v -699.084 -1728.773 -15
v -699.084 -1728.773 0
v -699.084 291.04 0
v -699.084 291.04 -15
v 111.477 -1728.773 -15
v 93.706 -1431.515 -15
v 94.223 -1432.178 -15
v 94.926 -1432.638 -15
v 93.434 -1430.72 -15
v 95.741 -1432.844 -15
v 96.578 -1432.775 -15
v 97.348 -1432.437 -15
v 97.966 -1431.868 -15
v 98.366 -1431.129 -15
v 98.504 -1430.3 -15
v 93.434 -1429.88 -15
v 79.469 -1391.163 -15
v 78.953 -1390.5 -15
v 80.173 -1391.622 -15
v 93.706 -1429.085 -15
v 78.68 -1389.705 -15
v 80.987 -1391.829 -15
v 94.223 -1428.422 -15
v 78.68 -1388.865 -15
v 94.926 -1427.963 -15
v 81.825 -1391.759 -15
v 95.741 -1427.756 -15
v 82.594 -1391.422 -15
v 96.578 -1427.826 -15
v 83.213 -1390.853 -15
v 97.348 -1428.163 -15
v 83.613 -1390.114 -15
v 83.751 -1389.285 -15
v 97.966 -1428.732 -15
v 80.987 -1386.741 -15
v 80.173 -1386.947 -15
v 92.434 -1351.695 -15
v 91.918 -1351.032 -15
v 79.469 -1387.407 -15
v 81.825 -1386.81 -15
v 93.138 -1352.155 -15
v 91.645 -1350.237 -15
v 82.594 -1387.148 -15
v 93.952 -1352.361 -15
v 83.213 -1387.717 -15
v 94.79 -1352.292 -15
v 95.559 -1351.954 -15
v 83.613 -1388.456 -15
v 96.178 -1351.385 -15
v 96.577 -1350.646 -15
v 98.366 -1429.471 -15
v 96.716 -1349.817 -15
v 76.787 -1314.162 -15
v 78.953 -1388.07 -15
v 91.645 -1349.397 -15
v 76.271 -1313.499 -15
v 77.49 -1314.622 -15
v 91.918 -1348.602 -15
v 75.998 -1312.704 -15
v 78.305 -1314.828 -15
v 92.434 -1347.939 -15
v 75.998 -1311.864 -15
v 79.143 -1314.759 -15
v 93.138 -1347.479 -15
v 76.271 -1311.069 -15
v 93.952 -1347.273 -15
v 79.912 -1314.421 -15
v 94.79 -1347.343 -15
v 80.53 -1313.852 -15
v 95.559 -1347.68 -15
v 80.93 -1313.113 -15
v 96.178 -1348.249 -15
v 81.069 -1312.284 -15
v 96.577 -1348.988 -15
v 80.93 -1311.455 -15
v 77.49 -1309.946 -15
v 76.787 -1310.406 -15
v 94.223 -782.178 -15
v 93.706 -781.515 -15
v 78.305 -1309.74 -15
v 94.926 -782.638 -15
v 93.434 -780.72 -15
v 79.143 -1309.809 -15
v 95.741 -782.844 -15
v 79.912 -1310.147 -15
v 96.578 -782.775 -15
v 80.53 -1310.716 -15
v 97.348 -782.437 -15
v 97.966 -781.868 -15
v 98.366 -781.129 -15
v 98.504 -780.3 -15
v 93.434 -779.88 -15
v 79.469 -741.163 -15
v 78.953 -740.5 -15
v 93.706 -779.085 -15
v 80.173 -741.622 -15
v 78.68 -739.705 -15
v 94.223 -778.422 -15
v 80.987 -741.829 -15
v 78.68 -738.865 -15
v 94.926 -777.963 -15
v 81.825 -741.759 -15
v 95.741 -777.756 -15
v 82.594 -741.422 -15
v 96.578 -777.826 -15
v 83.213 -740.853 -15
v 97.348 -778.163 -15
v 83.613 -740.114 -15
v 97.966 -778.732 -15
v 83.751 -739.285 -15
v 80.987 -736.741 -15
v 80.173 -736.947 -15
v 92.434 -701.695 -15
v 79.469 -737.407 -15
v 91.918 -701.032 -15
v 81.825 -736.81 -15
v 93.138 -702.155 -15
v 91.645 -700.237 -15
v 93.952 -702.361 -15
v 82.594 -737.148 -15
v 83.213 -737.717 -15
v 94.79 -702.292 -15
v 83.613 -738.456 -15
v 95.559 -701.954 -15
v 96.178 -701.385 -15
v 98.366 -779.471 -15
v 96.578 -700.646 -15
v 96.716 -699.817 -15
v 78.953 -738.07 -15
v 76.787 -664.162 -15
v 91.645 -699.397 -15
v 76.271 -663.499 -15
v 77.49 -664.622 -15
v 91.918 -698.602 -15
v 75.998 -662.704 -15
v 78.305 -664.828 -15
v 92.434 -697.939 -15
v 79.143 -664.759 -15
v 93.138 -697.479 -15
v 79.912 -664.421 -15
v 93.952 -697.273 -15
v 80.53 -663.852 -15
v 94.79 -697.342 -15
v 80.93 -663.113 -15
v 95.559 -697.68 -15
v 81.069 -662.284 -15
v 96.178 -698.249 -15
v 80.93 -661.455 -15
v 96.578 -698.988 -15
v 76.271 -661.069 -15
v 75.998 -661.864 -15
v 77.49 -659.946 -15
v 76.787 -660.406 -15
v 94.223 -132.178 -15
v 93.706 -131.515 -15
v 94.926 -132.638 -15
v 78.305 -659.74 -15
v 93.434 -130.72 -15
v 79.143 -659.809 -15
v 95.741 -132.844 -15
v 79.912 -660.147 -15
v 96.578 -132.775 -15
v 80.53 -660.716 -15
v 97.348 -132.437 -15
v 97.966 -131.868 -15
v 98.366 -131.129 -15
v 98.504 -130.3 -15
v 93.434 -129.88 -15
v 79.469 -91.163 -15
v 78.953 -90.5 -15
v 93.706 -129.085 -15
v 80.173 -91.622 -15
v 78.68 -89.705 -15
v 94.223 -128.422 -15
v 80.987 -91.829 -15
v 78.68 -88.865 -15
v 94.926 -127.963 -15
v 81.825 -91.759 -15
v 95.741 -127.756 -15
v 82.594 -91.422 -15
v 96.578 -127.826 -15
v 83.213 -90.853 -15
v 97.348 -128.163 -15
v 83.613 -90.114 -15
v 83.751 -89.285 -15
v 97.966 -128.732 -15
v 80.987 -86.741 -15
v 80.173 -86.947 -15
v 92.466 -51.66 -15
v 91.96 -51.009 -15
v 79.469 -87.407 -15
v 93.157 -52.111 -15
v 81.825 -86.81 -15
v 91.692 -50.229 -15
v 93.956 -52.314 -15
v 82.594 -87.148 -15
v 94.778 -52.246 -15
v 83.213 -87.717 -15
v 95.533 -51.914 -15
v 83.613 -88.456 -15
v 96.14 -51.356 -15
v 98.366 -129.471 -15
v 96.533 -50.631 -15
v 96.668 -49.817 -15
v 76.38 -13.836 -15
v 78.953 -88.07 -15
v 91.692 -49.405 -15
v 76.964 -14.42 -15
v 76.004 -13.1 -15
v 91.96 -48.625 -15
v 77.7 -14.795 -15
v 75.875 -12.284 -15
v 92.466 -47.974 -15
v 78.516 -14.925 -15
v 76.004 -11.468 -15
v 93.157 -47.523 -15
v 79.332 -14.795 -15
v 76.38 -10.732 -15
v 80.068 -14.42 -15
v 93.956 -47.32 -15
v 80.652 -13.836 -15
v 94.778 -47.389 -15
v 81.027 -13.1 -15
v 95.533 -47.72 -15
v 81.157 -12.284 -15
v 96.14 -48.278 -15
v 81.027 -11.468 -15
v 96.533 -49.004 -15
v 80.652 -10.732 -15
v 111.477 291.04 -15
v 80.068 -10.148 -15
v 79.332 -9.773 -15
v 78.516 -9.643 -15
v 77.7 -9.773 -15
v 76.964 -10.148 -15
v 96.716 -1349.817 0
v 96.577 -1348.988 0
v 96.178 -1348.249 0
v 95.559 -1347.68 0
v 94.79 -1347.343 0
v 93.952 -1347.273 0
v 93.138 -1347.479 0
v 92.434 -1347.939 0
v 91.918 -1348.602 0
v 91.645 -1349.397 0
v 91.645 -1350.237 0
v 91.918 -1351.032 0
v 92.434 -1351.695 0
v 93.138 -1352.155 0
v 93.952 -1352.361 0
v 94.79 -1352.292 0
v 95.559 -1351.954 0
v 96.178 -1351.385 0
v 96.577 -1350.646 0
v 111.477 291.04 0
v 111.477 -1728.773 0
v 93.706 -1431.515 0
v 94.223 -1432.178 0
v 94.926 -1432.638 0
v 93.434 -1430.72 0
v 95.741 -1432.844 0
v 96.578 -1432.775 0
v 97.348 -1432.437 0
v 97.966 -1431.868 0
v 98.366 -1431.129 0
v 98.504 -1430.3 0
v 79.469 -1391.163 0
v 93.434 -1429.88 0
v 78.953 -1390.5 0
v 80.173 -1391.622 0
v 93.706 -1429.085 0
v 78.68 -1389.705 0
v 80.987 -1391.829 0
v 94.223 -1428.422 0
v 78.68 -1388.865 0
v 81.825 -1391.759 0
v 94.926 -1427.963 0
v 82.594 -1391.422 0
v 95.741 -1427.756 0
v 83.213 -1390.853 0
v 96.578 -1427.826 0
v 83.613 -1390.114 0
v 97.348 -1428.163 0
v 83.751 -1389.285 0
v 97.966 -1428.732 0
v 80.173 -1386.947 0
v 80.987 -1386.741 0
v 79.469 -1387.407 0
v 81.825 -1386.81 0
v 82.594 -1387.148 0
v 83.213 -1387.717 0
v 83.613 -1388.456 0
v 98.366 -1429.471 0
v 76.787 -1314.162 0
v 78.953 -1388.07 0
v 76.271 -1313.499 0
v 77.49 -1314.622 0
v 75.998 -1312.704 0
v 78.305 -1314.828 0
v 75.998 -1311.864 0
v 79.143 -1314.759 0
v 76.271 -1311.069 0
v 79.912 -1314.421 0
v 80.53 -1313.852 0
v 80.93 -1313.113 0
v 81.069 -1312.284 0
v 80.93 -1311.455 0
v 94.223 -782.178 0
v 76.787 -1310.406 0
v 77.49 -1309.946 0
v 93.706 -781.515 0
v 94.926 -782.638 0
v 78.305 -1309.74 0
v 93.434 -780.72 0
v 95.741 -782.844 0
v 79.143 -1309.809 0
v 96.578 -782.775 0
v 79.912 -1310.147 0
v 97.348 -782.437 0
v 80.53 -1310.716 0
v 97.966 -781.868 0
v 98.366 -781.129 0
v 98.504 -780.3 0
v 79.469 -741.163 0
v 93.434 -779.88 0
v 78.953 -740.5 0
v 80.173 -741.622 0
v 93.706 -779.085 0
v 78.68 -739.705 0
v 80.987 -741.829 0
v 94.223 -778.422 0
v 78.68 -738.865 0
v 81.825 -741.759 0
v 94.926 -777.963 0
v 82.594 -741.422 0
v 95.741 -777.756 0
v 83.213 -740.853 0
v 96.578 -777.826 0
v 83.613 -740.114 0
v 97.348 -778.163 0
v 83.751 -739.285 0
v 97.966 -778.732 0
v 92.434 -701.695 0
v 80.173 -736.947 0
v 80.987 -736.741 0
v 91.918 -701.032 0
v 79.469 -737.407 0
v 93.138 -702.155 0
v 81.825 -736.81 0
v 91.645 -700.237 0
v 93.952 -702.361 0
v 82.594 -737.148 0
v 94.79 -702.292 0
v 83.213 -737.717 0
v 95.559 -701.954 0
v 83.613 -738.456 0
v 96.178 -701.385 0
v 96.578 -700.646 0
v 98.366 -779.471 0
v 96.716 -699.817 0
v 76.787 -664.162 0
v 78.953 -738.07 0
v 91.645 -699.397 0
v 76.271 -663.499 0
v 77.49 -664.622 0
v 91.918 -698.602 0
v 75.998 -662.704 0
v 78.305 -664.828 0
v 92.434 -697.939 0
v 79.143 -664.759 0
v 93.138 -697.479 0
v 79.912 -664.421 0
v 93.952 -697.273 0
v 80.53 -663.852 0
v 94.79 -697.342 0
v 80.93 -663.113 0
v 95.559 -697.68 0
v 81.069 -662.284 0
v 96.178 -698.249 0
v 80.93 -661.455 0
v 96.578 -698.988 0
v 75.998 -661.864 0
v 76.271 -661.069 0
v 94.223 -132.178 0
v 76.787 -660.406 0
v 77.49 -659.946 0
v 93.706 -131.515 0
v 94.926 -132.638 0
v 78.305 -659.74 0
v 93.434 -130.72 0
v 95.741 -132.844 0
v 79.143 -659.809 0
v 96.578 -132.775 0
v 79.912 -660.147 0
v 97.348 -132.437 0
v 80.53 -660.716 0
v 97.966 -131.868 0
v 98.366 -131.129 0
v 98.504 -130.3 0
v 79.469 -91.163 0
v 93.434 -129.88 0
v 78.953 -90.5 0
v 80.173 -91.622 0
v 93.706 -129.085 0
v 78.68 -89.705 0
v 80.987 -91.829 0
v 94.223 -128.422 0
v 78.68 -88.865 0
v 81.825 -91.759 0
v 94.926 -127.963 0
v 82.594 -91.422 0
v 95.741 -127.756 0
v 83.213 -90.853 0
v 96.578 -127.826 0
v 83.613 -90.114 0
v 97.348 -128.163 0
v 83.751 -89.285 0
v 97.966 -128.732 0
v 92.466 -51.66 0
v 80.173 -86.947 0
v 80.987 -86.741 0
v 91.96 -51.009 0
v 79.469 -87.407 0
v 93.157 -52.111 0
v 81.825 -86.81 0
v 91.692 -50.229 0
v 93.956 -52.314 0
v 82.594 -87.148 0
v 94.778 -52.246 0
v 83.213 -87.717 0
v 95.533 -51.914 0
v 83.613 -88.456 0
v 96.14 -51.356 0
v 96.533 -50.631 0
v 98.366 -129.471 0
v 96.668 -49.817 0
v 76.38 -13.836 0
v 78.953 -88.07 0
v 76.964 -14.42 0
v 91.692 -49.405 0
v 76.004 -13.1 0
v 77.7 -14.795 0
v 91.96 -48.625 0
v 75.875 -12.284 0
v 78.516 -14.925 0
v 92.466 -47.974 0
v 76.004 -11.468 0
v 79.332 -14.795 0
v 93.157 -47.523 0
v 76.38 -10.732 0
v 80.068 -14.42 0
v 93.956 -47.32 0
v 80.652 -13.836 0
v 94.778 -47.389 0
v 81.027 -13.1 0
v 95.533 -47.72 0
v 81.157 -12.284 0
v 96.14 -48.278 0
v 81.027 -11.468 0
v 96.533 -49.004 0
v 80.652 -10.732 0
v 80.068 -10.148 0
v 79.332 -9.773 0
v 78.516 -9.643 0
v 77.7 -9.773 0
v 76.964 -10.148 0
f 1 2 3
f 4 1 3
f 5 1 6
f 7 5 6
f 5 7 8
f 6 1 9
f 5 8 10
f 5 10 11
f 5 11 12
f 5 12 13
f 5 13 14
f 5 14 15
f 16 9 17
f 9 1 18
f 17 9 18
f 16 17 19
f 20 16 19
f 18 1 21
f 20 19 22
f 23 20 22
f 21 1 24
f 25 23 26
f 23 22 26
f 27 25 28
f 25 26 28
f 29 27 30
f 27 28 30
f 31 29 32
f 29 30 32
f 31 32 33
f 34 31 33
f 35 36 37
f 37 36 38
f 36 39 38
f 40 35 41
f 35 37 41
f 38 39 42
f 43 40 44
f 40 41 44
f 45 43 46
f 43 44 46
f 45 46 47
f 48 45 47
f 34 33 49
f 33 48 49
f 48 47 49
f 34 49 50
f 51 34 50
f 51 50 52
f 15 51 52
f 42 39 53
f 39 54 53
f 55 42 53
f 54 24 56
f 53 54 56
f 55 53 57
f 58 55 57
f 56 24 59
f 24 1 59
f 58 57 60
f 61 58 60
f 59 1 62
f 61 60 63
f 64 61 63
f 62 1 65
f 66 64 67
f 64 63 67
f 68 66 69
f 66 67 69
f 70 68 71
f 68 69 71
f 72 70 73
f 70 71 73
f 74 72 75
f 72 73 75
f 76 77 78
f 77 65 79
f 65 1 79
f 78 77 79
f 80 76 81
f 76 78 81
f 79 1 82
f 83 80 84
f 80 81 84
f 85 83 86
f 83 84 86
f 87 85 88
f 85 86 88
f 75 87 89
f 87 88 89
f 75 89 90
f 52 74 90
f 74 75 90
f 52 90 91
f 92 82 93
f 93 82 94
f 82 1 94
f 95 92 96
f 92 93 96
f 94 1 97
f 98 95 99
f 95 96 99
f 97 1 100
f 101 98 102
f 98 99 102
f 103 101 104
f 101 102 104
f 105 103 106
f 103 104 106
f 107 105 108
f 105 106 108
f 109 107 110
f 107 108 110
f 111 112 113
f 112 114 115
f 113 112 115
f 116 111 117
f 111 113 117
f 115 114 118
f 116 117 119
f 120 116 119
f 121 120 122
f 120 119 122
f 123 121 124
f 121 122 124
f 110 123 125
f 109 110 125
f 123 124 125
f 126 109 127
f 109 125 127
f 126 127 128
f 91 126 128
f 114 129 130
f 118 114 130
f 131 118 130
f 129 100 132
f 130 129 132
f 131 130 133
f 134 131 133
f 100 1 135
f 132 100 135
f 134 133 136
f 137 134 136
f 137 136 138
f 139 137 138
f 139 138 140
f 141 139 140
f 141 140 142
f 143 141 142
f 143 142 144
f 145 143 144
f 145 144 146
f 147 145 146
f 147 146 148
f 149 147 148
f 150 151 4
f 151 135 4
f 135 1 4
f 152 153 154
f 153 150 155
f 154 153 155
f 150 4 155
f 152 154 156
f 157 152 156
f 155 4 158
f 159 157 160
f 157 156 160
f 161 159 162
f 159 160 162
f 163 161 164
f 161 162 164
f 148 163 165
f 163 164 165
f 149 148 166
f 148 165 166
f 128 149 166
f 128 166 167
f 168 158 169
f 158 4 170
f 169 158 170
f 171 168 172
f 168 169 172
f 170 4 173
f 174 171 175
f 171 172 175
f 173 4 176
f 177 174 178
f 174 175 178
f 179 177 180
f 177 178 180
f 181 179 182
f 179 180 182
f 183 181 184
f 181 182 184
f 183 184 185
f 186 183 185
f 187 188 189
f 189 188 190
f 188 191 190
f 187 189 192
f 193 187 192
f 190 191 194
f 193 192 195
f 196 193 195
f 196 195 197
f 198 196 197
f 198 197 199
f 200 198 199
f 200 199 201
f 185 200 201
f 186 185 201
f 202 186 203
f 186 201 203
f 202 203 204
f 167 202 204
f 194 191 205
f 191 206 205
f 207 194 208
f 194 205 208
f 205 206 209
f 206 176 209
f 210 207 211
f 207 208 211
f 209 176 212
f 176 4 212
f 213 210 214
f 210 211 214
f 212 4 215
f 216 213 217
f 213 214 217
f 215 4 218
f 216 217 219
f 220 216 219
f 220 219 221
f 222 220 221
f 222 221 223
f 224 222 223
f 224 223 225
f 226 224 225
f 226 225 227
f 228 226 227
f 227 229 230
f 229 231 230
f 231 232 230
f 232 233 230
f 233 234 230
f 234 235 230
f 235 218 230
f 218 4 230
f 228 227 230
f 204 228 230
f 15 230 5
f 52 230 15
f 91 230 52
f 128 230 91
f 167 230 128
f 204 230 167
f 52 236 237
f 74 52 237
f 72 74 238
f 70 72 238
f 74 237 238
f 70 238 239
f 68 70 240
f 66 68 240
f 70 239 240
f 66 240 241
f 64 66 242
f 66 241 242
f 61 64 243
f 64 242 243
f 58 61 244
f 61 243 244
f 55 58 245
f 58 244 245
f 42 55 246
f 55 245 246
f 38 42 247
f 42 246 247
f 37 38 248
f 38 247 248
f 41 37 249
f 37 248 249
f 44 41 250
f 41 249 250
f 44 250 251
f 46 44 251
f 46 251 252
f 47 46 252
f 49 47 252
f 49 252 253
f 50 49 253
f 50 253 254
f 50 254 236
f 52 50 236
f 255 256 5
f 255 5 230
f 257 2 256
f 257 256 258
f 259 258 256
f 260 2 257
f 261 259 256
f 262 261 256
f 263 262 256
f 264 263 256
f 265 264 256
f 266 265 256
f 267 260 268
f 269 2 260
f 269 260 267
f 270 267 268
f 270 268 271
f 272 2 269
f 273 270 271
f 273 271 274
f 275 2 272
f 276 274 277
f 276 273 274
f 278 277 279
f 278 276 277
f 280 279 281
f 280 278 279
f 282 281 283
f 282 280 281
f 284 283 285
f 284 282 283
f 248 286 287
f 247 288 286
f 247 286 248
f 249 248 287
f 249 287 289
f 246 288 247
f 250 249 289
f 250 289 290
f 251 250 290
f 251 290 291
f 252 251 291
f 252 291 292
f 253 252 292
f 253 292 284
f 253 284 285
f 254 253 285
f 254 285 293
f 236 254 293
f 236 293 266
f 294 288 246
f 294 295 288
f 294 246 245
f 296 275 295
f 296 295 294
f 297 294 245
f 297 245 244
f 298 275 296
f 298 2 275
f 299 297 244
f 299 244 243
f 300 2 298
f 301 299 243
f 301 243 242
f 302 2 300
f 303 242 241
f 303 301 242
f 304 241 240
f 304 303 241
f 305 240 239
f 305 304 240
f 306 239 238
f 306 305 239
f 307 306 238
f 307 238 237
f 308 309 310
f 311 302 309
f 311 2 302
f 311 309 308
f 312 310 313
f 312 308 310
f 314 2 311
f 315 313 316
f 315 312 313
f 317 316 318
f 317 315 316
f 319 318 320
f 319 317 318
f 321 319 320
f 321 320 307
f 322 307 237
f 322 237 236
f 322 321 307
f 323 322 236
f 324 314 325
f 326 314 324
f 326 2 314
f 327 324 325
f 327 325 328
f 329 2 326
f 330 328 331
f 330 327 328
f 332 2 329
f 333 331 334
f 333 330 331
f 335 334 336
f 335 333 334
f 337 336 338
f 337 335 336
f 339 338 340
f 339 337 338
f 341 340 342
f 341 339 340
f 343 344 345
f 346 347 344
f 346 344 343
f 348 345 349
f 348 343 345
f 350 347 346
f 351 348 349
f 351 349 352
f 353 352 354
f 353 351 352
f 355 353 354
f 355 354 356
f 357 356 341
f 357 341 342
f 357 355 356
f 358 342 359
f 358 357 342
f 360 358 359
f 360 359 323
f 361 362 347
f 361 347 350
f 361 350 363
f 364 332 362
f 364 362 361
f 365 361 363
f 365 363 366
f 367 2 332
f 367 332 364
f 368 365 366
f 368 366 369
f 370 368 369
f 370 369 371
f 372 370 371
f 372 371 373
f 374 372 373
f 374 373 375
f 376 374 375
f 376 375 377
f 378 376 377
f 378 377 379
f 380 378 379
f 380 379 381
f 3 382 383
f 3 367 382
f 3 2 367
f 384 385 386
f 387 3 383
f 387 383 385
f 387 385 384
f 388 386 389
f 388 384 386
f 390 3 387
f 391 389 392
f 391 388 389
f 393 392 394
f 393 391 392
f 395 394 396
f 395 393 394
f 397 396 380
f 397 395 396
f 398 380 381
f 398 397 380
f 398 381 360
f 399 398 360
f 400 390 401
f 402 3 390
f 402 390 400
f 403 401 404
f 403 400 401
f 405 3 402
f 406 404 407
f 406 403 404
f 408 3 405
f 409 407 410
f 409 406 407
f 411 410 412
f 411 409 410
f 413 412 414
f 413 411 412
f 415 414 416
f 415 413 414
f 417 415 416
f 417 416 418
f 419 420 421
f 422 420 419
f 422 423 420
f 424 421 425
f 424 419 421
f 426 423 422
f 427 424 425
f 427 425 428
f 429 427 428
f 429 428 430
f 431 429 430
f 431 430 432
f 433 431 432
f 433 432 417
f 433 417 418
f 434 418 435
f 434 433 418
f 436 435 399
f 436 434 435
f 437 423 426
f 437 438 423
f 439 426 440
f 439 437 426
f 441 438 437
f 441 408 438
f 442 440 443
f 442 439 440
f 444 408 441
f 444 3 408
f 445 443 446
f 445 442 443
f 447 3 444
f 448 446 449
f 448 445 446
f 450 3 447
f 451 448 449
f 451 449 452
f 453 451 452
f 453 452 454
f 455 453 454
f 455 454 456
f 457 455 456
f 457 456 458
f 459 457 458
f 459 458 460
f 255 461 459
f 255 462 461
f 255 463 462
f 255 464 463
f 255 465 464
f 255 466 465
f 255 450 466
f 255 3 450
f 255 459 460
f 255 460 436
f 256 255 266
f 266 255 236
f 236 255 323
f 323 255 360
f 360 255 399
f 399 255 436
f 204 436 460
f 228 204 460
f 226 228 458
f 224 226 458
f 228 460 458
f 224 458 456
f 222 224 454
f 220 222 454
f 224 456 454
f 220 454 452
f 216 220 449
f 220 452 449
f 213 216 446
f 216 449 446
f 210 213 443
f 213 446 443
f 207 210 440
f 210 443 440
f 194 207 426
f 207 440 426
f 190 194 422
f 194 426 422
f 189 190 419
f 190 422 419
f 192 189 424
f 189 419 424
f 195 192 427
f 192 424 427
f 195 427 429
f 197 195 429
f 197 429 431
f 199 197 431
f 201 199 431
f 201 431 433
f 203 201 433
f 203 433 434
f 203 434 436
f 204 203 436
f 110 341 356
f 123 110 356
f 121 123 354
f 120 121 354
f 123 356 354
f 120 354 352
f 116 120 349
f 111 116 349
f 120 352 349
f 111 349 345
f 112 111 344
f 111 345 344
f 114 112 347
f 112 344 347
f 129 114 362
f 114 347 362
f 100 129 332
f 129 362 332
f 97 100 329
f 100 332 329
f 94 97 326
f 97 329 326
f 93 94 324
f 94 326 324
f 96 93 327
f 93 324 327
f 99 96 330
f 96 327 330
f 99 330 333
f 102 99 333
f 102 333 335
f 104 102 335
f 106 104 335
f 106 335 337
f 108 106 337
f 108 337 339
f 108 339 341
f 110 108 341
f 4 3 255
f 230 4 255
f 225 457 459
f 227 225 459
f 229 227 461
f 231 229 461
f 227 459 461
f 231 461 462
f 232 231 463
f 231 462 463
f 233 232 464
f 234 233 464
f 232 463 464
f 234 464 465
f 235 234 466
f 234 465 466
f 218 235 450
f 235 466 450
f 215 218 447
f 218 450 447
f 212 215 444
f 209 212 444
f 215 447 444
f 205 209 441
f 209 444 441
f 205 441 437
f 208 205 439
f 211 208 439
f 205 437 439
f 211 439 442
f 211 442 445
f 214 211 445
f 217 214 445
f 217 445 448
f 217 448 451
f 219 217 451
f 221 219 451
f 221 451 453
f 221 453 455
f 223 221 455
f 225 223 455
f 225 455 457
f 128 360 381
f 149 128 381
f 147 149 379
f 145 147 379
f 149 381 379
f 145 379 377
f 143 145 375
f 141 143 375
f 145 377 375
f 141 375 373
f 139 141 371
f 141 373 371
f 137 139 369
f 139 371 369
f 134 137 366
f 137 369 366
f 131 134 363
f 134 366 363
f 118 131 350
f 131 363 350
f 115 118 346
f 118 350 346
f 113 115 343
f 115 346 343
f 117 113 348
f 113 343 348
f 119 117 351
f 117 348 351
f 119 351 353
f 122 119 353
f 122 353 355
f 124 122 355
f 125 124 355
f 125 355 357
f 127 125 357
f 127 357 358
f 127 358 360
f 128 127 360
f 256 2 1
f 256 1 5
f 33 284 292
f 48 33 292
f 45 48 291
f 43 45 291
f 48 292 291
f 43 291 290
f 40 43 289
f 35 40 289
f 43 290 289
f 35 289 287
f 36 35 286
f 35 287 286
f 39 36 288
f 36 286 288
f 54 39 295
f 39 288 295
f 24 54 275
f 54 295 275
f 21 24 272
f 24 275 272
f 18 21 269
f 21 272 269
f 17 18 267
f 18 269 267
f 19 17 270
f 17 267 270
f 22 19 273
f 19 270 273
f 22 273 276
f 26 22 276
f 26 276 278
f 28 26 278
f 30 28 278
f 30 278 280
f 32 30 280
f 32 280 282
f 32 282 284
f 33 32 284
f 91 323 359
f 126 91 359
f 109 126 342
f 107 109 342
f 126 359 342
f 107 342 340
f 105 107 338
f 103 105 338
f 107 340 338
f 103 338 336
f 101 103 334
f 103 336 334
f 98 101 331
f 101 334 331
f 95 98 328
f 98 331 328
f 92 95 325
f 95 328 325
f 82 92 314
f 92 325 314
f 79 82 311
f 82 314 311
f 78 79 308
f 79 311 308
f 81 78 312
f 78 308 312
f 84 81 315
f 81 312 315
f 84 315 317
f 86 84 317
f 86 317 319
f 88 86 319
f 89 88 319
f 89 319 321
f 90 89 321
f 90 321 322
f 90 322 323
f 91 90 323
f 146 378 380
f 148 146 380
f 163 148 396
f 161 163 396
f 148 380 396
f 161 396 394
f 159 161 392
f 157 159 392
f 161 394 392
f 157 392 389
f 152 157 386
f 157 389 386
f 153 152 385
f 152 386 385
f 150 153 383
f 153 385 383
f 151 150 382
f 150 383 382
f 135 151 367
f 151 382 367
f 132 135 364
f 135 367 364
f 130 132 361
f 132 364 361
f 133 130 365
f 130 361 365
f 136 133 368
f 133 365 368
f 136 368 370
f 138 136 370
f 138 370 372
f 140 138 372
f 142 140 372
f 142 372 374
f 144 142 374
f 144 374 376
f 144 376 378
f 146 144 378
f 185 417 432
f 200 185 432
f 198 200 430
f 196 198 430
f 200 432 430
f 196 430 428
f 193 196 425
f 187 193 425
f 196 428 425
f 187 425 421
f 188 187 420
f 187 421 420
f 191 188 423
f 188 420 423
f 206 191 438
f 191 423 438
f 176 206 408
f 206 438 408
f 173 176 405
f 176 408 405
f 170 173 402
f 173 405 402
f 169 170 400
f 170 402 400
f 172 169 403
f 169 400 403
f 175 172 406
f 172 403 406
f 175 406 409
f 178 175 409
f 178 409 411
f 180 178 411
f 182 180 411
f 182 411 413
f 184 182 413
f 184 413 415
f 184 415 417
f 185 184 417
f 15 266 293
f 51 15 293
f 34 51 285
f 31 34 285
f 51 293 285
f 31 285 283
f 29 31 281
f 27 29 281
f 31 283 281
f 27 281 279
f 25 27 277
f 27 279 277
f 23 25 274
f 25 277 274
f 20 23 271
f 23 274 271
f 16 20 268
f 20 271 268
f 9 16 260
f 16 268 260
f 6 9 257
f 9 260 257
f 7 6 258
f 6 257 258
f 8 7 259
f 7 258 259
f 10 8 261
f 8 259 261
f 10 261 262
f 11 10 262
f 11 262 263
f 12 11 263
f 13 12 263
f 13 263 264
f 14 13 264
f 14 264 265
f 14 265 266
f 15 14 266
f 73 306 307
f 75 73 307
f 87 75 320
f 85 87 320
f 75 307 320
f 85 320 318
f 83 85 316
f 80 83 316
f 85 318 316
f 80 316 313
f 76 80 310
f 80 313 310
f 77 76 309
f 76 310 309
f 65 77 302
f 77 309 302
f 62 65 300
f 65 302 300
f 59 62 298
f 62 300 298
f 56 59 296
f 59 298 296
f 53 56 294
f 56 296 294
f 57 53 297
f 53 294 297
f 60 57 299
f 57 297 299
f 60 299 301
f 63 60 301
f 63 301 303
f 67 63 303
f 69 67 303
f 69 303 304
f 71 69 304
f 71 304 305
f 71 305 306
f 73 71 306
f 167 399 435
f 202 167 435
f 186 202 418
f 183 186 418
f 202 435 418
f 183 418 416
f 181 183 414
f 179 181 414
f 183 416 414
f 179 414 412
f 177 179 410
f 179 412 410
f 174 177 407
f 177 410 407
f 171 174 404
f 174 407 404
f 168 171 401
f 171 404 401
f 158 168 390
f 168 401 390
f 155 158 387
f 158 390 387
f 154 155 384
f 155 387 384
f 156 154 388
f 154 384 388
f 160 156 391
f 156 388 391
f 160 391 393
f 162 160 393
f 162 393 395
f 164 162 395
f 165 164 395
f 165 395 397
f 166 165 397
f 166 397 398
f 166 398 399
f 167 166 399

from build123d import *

# Parameters (mm, degrees)
SKETCH1_W           = 810.560523627
SKETCH1_H           = 2019.812900606
BOSS_EXTRUDE1_DEPTH = 15
SKETCH2_R           = 2.64063864
SKETCH2_R_2         = 2.505206938
SKETCH2_R_3         = 2.552698952
SKETCH2_R_4         = 2.552695735
SKETCH2_R_5         = 2.552698993
SKETCH2_R_6         = 2.5527
SKETCH2_R_7         = 2.552586069
SKETCH2_R_8         = 2.552691913
CUT_EXTRUDE1_DEPTH  = 1865.83244333


with BuildPart() as part:
    # Sketch1 → Boss-Extrude1 (new body)
    with BuildSketch(Plane.XY):
        with Locations((-293.803483123, -718.8668024)):
            Rectangle(SKETCH1_W, SKETCH1_H)
    extrude(amount=-BOSS_EXTRUDE1_DEPTH)

    # Sketch2 → Cut-Extrude1 (cut, through all)
    with BuildSketch(Plane.XY):
        with Locations((78.515875942, -12.284076492)):
            Circle(SKETCH2_R)
        with Locations((94.163153701, -49.817072708)):
            Circle(SKETCH2_R_2)
        with Locations((81.198266415, -89.284759451)):
            Circle(SKETCH2_R_3)
        with Locations((95.951414016, -130.300198616)):
            Circle(SKETCH2_R_4)
        with Locations((78.515875942, -662.284076492)):
            Circle(SKETCH2_R_5)
        with Locations((94.163153701, -699.817072708)):
            Circle(SKETCH2_R_6)
        with Locations((81.198266415, -739.284759451)):
            Circle(SKETCH2_R_7)
        with Locations((95.951414016, -780.300198616)):
            Circle(SKETCH2_R_7)
        with Locations((78.515875942, -1312.284076492)):
            Circle(SKETCH2_R_8)
        with Locations((94.163153701, -1349.817072708)):
            Circle(SKETCH2_R_7)
        with Locations((81.198266415, -1389.284759451)):
            Circle(SKETCH2_R_6)
        with Locations((95.951414016, -1430.300198616)):
            Circle(SKETCH2_R_6)
    extrude(amount=-CUT_EXTRUDE1_DEPTH, mode=Mode.SUBTRACT)


solid = part.part
